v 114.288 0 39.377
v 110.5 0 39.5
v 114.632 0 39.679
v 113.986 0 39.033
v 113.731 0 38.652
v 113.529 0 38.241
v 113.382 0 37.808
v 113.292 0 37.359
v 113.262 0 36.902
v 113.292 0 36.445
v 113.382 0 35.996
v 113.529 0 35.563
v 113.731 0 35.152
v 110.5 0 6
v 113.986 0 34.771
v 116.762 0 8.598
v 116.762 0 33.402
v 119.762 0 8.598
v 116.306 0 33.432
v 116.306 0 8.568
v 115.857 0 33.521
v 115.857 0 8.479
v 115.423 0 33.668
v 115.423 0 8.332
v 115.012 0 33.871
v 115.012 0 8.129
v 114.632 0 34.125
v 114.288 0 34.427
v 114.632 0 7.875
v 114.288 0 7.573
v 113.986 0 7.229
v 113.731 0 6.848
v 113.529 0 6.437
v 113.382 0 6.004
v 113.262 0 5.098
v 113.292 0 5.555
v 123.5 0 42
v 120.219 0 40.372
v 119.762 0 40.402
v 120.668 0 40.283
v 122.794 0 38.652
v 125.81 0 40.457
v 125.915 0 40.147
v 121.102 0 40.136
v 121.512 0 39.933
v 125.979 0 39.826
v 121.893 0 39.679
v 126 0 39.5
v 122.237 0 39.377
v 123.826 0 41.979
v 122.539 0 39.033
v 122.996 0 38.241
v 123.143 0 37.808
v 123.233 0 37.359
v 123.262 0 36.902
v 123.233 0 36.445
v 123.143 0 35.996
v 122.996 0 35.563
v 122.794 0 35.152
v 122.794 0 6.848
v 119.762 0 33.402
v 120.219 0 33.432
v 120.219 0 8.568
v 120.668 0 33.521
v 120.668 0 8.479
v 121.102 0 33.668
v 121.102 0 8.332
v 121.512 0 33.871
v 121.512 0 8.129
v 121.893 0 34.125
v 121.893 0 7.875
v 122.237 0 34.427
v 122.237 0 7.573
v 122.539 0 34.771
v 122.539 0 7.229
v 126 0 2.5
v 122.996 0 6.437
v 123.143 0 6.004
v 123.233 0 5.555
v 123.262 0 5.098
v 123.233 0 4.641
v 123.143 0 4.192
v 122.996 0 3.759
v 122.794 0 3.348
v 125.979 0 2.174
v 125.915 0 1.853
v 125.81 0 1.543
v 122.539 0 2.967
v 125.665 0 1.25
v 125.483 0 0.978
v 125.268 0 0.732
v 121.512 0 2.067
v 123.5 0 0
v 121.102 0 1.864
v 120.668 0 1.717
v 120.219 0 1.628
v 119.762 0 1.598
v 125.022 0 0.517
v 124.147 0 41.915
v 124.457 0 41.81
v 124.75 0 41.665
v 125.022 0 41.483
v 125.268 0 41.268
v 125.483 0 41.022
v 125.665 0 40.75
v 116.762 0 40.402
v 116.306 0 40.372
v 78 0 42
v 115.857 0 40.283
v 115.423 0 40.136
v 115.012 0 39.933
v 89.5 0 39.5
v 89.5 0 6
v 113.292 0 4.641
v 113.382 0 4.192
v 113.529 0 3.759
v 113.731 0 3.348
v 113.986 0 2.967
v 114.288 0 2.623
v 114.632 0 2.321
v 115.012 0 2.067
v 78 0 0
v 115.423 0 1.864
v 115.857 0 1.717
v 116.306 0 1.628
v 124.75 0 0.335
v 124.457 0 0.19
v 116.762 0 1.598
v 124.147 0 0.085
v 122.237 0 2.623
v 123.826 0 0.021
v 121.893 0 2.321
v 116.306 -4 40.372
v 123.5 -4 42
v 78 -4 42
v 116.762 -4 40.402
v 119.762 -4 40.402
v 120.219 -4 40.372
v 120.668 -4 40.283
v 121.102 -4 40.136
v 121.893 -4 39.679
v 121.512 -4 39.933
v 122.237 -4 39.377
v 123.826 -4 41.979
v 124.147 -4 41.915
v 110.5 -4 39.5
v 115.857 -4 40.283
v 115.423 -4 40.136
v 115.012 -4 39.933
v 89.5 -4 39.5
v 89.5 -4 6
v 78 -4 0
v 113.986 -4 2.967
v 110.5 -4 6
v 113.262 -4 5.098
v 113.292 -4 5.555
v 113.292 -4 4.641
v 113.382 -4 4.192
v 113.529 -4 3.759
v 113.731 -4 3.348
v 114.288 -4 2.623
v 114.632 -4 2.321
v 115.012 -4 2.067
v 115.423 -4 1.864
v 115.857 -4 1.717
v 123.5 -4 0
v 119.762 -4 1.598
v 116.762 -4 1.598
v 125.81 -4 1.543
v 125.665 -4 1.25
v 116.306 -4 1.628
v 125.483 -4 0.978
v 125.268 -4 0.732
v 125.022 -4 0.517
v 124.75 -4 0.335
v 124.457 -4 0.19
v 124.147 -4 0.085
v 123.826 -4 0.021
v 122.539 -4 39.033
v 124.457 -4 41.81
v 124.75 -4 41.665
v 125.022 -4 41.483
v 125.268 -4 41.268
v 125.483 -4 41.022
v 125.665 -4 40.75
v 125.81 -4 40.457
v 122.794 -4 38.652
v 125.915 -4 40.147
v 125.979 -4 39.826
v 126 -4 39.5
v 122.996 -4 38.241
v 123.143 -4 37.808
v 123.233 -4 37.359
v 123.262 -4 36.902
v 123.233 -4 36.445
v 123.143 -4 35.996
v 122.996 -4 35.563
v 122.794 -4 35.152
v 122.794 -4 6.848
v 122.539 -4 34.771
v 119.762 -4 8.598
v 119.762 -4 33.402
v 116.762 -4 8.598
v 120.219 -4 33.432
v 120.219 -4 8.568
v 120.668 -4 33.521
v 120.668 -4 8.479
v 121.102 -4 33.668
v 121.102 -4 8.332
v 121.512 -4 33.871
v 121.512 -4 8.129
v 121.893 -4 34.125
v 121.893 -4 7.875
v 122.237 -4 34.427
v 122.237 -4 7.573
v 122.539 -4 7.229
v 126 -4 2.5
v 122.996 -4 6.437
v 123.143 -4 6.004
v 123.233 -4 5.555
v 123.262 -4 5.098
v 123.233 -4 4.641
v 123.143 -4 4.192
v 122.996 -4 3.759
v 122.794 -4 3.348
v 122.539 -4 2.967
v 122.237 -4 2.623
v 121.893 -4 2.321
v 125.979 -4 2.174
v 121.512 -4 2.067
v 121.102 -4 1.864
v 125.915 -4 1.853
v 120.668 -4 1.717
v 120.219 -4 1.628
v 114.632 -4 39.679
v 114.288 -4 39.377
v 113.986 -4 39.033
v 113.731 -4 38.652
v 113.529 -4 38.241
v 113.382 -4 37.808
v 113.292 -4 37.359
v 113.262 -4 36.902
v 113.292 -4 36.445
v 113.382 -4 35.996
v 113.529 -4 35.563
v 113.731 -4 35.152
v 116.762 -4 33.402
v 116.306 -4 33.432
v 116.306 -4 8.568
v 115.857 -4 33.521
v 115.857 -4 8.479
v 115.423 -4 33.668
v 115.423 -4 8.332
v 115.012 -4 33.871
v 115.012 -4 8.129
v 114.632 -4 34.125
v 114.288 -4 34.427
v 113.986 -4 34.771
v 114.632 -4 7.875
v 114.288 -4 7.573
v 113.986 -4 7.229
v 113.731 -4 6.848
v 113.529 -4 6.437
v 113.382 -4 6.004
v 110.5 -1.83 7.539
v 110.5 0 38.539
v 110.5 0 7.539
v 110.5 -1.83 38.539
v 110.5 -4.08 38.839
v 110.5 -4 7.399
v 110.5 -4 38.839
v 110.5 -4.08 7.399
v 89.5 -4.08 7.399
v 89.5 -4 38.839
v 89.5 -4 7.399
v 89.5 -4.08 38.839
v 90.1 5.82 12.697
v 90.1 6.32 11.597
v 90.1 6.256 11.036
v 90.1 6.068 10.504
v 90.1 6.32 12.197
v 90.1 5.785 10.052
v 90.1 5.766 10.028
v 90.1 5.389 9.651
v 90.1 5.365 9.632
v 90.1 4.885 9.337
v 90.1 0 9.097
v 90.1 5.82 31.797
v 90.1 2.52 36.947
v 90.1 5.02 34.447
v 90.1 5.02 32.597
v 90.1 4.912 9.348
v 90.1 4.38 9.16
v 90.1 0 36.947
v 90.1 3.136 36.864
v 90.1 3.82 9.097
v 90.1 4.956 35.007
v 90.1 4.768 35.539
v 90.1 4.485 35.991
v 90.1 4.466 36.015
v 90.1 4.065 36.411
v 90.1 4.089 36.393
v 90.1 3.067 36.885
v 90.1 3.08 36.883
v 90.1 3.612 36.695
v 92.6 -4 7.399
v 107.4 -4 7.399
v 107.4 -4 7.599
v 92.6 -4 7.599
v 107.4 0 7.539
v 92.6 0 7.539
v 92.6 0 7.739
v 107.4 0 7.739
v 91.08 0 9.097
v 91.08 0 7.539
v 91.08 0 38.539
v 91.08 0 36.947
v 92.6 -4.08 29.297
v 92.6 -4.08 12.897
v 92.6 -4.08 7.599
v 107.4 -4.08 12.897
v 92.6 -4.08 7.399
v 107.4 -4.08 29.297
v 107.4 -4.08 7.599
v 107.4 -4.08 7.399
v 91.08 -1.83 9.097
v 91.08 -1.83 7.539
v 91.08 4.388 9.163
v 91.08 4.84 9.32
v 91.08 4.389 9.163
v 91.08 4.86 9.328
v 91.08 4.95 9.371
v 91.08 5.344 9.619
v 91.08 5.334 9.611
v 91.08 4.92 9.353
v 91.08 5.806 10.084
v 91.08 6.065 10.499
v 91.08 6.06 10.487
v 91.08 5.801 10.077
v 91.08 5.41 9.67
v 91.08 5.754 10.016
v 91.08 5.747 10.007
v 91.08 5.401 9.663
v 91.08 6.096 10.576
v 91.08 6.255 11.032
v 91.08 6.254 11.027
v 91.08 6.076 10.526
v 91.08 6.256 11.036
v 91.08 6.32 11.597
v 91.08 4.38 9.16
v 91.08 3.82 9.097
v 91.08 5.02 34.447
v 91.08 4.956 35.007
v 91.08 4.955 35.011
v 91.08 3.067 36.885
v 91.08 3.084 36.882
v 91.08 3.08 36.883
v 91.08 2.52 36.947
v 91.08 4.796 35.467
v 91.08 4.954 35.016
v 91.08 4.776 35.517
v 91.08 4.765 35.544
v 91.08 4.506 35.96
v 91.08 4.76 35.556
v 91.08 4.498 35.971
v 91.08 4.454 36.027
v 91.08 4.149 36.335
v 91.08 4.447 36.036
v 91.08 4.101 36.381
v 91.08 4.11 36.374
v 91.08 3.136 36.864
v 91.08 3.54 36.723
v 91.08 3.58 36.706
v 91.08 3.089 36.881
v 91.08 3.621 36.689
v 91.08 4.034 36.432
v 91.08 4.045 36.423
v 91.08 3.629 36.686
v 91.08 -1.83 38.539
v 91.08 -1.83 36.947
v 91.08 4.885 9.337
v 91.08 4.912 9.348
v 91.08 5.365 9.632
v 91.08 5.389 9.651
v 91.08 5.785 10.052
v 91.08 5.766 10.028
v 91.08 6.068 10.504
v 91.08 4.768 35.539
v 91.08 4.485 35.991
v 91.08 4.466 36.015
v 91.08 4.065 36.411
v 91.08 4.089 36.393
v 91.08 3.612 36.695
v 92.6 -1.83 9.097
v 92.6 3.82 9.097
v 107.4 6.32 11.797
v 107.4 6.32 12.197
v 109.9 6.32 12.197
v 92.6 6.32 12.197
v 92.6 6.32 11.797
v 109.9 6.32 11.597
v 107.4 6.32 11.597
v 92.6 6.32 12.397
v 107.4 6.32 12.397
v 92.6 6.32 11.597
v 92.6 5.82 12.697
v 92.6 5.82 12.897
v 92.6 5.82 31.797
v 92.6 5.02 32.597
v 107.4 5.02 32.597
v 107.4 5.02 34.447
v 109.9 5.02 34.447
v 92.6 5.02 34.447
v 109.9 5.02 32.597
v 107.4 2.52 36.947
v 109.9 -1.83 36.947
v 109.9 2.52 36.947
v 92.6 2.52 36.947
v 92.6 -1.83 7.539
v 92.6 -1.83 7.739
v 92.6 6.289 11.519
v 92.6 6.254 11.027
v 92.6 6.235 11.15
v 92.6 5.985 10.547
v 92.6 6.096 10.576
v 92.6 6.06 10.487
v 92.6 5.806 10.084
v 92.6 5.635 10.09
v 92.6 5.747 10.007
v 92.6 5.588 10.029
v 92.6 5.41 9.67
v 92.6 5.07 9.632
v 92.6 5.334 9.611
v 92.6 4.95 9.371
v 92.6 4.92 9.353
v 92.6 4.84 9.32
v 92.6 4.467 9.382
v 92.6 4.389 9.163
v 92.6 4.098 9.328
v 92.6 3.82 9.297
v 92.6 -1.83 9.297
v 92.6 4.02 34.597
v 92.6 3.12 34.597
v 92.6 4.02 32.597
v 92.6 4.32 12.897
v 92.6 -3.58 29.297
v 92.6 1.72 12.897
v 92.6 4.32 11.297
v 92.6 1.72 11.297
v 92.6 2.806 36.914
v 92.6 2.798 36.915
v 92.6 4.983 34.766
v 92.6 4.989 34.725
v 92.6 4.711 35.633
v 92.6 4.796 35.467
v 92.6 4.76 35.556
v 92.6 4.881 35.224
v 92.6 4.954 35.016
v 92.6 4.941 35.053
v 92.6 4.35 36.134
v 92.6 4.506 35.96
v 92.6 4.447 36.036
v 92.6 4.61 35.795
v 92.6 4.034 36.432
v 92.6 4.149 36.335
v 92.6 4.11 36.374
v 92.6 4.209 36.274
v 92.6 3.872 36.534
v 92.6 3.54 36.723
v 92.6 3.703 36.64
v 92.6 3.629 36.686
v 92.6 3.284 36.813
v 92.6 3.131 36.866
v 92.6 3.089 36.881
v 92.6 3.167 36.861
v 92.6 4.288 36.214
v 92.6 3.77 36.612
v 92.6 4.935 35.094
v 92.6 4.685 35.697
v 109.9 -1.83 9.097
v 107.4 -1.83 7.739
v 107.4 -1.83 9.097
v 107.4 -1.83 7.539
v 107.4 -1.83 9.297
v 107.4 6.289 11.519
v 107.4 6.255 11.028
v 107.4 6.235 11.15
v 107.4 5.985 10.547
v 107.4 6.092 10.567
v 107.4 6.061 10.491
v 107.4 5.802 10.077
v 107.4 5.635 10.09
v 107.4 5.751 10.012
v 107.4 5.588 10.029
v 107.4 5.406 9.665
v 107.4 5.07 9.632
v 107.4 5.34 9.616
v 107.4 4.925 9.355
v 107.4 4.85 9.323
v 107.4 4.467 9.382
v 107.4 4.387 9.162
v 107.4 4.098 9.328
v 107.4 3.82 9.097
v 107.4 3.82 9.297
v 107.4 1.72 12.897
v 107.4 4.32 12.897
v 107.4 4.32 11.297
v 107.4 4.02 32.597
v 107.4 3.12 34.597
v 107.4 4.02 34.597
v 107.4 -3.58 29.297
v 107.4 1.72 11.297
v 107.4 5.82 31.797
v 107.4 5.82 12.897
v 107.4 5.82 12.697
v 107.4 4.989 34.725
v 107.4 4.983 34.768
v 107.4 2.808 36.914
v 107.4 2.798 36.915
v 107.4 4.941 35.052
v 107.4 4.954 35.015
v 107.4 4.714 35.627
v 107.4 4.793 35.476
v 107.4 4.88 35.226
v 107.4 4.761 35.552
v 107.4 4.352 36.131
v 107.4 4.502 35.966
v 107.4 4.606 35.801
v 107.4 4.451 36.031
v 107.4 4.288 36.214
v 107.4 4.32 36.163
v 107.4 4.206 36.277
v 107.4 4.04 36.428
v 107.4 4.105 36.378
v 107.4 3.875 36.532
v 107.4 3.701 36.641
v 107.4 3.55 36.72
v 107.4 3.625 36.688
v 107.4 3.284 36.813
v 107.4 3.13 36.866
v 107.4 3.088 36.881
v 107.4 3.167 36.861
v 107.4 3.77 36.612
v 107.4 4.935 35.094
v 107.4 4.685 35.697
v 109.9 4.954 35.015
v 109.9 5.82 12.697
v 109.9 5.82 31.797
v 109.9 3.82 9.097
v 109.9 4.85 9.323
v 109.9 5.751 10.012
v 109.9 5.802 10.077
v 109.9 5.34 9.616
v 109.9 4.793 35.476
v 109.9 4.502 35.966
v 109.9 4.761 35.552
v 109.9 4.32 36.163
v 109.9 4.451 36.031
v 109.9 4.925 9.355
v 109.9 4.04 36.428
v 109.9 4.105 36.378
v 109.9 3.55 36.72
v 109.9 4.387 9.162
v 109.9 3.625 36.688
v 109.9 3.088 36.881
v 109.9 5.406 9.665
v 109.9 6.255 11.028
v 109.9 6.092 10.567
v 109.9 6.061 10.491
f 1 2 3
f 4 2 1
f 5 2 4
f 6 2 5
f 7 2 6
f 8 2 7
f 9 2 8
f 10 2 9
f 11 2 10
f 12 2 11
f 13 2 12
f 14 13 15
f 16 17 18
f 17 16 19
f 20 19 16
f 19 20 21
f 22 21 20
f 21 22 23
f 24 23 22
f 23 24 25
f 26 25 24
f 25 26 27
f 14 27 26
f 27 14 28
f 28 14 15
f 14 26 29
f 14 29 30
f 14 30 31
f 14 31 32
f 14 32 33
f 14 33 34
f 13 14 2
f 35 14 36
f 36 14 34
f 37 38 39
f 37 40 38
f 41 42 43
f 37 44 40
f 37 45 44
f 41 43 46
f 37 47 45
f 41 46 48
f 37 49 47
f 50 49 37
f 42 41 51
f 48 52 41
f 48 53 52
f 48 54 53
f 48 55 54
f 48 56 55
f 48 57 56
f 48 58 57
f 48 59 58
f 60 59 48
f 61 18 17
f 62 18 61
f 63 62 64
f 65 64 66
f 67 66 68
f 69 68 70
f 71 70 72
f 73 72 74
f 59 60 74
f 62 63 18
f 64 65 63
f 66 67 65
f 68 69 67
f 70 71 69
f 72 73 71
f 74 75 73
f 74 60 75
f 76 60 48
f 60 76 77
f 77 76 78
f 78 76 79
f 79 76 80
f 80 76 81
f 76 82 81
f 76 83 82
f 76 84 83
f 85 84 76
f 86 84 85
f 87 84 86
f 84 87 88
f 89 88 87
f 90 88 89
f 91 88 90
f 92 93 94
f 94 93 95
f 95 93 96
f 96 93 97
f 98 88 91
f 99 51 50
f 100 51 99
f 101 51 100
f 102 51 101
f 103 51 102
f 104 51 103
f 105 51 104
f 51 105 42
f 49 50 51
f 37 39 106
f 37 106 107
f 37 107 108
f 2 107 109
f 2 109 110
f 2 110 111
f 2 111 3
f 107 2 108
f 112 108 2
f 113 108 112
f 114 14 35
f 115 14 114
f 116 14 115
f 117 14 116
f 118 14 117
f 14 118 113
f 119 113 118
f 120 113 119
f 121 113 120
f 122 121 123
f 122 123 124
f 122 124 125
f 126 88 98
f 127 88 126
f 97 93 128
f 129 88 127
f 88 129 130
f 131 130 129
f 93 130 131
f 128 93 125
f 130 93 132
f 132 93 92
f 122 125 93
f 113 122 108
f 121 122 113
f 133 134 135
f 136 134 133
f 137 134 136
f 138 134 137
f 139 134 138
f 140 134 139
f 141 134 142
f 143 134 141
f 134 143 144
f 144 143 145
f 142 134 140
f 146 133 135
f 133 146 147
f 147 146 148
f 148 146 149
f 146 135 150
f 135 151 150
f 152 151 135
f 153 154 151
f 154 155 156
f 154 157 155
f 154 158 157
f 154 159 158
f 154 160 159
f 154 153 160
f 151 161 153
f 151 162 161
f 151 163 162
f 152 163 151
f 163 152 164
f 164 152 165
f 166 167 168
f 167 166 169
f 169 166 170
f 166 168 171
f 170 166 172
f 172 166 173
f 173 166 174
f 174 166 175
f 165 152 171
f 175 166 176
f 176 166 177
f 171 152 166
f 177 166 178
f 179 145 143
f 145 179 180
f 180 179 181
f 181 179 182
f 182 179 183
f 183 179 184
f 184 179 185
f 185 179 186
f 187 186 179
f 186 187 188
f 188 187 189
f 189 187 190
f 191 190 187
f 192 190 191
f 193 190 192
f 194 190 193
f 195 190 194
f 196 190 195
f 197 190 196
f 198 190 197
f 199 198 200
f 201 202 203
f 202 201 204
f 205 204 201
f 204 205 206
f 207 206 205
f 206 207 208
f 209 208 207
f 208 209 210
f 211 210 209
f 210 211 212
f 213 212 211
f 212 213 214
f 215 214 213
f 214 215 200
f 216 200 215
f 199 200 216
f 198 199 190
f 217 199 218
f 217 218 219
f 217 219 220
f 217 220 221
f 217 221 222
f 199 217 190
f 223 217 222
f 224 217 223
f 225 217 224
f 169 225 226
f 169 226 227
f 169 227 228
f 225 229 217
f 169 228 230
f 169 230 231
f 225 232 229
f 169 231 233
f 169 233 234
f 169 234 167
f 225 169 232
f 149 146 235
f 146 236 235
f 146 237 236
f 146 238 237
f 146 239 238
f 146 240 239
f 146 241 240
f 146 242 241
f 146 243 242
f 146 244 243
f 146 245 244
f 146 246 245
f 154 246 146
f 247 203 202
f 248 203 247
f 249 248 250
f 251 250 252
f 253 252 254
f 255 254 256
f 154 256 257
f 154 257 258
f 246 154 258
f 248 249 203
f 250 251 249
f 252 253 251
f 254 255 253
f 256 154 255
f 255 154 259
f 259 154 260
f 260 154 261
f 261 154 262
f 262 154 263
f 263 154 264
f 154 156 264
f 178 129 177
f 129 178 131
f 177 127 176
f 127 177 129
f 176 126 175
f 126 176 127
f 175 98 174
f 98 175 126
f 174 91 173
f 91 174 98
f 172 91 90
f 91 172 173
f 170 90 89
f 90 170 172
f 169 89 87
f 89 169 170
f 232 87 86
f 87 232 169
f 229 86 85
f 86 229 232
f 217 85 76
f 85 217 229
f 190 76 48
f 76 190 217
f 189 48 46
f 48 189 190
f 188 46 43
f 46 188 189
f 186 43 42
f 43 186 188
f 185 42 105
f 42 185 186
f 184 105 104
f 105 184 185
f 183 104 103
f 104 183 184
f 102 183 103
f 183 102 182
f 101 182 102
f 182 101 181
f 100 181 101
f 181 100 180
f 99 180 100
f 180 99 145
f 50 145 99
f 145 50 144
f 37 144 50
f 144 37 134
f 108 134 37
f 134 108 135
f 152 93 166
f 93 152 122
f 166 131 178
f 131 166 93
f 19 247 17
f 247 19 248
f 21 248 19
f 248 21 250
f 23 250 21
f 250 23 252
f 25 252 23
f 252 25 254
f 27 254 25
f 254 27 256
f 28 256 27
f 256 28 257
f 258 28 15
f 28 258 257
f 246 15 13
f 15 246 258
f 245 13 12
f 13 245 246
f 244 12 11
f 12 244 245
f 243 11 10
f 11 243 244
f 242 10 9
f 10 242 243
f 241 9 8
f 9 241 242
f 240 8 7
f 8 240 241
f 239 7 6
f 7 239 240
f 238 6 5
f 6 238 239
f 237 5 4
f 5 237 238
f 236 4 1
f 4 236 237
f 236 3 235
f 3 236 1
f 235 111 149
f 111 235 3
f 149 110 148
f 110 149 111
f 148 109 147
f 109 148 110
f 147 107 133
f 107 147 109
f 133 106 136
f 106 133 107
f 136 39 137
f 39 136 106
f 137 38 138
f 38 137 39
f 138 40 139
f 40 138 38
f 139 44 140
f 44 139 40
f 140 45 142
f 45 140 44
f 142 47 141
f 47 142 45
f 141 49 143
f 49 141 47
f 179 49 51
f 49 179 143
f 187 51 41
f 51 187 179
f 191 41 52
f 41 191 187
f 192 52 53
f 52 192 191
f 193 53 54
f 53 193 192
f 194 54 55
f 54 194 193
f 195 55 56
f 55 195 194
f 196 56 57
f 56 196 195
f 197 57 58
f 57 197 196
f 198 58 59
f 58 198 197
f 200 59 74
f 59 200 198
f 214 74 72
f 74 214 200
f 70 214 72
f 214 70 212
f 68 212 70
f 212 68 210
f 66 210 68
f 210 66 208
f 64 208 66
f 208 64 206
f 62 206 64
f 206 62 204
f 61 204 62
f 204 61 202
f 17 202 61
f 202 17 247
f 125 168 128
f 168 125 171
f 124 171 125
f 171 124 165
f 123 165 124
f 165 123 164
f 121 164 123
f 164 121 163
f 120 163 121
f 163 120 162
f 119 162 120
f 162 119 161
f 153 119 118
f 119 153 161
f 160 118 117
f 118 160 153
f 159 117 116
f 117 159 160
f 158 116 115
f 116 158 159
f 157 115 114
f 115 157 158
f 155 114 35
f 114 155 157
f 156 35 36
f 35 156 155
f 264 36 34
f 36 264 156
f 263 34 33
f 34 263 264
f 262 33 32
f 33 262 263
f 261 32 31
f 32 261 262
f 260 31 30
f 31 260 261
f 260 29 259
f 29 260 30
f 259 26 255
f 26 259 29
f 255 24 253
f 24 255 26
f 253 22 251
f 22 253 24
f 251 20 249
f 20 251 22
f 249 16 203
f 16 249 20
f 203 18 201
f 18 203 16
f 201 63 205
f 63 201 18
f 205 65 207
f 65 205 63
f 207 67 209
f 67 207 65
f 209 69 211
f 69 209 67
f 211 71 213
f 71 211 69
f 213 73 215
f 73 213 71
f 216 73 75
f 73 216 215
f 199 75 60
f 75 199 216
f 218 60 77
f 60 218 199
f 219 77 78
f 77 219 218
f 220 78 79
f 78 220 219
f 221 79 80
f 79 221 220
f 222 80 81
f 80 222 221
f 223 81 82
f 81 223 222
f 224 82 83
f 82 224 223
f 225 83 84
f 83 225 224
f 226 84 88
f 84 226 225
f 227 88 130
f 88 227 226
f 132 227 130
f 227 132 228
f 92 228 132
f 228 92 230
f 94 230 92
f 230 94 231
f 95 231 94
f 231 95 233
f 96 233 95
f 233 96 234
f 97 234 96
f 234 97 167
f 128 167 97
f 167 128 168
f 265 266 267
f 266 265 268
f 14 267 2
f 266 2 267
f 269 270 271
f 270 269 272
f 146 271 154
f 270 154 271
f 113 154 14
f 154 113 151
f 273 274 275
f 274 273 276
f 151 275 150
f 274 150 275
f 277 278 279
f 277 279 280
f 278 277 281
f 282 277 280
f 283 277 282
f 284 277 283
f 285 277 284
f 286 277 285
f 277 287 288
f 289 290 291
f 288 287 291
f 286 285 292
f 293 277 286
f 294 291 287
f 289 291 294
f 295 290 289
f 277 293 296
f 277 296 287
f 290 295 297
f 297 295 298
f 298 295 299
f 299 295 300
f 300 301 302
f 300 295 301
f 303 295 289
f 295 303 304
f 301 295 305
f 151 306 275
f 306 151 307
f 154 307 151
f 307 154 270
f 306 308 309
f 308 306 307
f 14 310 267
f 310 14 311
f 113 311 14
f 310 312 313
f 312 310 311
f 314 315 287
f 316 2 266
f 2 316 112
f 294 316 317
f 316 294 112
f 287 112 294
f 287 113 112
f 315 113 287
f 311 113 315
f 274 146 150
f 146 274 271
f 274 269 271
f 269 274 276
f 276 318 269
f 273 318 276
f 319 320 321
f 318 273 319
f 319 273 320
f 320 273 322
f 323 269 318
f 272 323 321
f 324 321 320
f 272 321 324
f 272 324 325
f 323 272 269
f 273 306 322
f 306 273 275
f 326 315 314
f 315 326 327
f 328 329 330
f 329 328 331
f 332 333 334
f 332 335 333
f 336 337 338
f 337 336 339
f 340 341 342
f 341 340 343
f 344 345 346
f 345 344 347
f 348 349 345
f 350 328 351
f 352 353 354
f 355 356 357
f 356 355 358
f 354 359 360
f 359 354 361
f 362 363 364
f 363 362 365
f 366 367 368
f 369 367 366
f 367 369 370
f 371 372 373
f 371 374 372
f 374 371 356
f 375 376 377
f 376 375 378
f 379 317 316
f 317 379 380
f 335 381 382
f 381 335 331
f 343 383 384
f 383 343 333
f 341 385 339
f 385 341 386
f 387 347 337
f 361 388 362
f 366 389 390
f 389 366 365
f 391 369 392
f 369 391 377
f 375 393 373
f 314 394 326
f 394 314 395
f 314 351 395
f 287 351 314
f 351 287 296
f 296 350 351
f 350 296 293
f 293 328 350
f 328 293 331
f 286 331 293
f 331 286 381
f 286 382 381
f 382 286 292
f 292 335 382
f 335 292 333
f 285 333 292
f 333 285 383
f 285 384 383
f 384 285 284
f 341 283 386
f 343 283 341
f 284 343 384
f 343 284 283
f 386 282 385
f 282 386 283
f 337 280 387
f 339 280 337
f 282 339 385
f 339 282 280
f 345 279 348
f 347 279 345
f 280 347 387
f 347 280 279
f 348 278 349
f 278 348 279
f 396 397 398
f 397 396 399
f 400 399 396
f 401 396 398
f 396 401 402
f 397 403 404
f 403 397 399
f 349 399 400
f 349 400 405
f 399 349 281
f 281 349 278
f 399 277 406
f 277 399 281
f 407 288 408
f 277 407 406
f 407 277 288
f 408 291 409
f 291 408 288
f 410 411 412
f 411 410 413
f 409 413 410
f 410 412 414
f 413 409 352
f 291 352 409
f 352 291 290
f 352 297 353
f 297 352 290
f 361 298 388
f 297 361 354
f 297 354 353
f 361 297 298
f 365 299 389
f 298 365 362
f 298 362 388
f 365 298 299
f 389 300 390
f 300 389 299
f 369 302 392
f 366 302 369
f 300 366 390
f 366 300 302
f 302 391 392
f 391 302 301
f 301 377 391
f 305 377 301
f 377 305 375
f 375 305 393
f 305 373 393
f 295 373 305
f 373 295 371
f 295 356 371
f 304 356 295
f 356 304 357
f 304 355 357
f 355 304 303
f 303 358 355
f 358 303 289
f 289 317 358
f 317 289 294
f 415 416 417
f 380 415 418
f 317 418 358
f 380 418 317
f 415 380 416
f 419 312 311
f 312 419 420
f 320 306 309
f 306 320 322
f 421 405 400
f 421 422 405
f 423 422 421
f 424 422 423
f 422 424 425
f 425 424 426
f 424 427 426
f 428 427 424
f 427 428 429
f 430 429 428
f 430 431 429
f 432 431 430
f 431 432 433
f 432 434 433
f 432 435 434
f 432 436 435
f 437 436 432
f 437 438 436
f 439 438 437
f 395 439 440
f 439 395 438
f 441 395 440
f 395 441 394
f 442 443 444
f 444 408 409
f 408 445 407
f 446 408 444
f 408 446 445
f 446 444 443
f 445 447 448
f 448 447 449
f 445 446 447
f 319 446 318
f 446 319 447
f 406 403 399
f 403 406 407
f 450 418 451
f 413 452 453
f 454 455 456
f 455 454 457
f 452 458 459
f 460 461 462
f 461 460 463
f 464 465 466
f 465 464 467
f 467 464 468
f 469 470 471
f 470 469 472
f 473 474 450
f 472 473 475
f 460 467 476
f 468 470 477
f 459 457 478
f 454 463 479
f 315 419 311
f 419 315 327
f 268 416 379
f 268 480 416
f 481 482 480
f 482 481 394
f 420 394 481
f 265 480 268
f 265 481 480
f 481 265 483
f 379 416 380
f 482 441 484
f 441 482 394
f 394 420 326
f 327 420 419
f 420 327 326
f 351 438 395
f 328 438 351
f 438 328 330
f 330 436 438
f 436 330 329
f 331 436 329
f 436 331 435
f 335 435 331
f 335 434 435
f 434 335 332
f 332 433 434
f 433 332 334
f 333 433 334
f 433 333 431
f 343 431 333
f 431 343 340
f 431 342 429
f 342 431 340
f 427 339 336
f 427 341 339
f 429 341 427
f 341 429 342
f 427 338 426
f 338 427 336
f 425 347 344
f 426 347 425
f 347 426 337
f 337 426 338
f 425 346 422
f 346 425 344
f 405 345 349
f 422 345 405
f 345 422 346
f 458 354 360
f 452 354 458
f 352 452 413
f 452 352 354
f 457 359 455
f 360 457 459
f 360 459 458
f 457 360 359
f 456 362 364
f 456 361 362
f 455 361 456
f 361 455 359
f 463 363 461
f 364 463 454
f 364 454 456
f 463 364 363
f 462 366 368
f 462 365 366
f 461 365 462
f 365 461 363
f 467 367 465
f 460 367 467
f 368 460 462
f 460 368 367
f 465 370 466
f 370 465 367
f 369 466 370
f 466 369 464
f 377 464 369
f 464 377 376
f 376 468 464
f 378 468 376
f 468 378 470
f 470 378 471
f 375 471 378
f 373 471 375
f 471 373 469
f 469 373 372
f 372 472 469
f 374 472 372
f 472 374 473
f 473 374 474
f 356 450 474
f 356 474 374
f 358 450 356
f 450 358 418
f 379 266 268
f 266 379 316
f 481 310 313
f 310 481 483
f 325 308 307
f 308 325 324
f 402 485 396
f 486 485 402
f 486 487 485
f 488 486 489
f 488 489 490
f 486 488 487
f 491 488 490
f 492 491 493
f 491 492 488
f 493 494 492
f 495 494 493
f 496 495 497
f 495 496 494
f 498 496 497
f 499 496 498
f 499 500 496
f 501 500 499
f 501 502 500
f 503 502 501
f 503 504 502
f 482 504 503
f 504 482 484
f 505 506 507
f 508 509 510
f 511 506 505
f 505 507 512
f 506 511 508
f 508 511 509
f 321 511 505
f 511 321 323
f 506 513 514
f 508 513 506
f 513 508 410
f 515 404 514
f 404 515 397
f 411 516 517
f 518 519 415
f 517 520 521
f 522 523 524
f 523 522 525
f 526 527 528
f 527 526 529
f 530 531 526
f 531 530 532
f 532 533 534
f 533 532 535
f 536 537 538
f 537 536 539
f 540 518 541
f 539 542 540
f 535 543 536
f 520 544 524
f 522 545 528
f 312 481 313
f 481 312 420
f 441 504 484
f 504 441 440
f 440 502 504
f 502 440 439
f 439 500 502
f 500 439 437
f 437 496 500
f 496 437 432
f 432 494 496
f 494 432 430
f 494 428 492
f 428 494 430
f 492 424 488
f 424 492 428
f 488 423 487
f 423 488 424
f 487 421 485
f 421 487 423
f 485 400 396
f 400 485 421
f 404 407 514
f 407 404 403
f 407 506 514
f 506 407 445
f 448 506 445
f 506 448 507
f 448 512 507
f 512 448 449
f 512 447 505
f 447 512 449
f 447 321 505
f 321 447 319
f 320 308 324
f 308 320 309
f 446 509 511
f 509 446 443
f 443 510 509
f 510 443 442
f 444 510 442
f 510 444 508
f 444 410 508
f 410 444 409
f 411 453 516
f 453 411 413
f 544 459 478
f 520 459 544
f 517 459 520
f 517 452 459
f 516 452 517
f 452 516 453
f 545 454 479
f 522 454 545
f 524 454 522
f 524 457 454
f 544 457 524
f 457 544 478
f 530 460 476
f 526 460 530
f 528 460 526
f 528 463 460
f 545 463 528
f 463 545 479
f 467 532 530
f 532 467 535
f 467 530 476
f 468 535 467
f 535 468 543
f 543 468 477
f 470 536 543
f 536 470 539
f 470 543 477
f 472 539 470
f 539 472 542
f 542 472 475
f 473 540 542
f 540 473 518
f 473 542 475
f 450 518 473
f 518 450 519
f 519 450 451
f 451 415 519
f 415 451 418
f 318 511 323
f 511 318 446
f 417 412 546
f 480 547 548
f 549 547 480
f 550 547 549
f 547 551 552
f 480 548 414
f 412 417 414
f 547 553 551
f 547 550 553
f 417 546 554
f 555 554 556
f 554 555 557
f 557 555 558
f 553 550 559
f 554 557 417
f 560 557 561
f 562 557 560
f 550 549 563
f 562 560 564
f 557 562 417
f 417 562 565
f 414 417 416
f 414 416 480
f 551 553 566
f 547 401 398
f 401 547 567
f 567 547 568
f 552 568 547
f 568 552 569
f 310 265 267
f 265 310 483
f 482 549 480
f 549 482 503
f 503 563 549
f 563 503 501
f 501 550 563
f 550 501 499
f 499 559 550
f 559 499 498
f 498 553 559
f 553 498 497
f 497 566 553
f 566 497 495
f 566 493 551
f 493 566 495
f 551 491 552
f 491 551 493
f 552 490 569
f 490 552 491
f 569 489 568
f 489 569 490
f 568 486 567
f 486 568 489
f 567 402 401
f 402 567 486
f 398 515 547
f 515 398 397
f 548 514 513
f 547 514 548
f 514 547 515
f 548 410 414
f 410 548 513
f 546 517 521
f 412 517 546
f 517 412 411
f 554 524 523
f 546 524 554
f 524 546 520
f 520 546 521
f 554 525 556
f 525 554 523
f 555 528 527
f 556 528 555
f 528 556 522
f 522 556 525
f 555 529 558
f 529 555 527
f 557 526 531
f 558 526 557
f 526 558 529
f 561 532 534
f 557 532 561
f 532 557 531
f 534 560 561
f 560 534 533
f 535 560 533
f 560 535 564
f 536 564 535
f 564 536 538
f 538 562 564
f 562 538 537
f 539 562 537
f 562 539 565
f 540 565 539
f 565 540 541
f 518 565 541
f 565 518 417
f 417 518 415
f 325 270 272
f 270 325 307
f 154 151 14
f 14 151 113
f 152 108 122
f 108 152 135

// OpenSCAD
// Lab Rax generic equipment tray + faceplate (wizard template).
// Faceplate derived from the Pi4 baseline; rack holes follow the four-corner layout of the user-supplied
// 1U blank plate (faceplate_mounting.json): EVERY rack unit gets 4 holes, never a single centre pair.
// The wizard appends override assignments at the end of this file.
// PROPOSED, UNVALIDATED: printed fit, strength and rack clearance are UNKNOWN.
$fn=48;
part="assembly";            // assembly, faceplate, tray, combined, rear_bracket
// Device envelope (mm). Origin of hole coordinates = device front-left corner, seen from above.
dev_w=85; dev_d=56; dev_h=20;
holes=[];                   // [[x,y],...] mounting hole centres
hole_d=2.7;                 // device mounting hole diameter
device_mount="inserts";     // inserts, pegs, clips, straps
standoff=6;                 // device lift above tray floor
insert_pilot=3.2;           // pilot for heat-set insert (inserts mode)
board_t=1.6;                // board/flange thickness (pegs, clips)
joint="screw";              // screw, single ("snap" retired 2026-10-19: too brittle; kept as history)
u=1;                        // faceplate height in rack units
keystones=[];               // [x,...] keystone centres on faceplate (X=0 centre)
// Keystone v2 (2026-10-19, now the fallback; see ks_style): re-modelled from measurements of Brian's reference keystone frame
// (14.5 x 16 opening was too narrow when printed). Opening 14.8 x 16.6 through the plate, plus a rear collar
// 19.8 x 27.85 reaching 9.2 mm behind the front face (bottom lip to 10.4) that carries the latch ramp and catches.
ks_w=14.8; ks_h=16.6;       // front opening
ks_ow=19.8; ks_ob=11.9; ks_ot=15.95; ks_od=9.2; ks_lip=10.4;  // collar width, below/above opening centre, depth
ports=[];                   // [[x,z,w,h,r],...] faceplate cut-outs, z from plate bottom, r=corner radius
front_gap=12;               // device front to faceplate rear face
margin=8;                   // tray border around device
rear_support=false;         // heavy/deep equipment: tray runs to the rear posts and screws to a rear bracket
coupon=[];                  // test coupon: [x0,x1,ymax] keeps only that slice of the part

// 4 mm plate (owner default 2026-10-18). Corner radius is limited by the four-corner holes:
// the reference holes sit 1.6 mm from the top/bottom edge, so larger corners would cut into them.
plate_w=252; plate_t=4; plate_r=2.5; plate_h=u*44.45-2.45;
hole_x=118.2625; hole_dz=15.902;   // each U: holes at its centre ±hole_dz (5.098 / 36.902 on a 1U plate)
rack_depth=240;             // Lab Rax frame depth (front of front posts to back of rear posts)
nudge=0;                    // render-repair only: tiny size offset applied when OpenSCAD 2021 emits a sliver
tray_t=3; tray_z=7;
tray_w=dev_w+2*margin; tray_d=rear_support?rack_depth:dev_d+front_gap+margin;
tray_x=-tray_w/2; tray_y=0;
dev_x=-dev_w/2; dev_y=front_gap; floor_top=tray_z+tray_t;
jx=min(40,tray_w/2-12); joint_x=[-jx,jx];
tongue_w=12; tongue_depth=7; tongue_h=3; tongue_z=tray_z+3.5;
slot_clear=0.3; boss_d=9; m3_clear=3.4; joint_pilot=4.0;  // 4.0 = the printed, well-fitting Pi4 trial

module capsule2d(len=10,diam=7){hull(){translate([-(len-diam)/2,0])circle(d=diam);translate([(len-diam)/2,0])circle(d=diam);}}
module rrect(w,h,r){rr=min(r,w/2-0.01,h/2-0.01);if(rr<=0)square([w,h],center=true);else offset(r=rr)square([w-2*rr,h-2*rr],center=true);}
// Mirror front-of-tray features to the rear (about the rack's mid-depth).
module to_rear(){translate([0,rack_depth/2,0])mirror([0,1,0])translate([0,-rack_depth/2,0])children();}

// Faceplate outline seen from the front: 2D X = rack X, 2D Y = height Z.
// rear=true cuts the larger keystone pocket; plain=true leaves out keystones/ports (rear bracket).
module plate2d(rear=false,plain=false){
 difference(){
  hull()for(sx=[-1,1],sz=[-1,1])translate([sx*(plate_w/2-plate_r),plate_h/2+sz*(plate_h/2-plate_r)])circle(r=plate_r+nudge);
  for(i=[0:u-1],dz=[-hole_dz,hole_dz],x=[-hole_x,hole_x])translate([x,i*44.45+21+dz])capsule2d();
  if(!plain){
   for(p=ports)translate([p[0],p[1]])rrect(p[2],p[3],p[4]);
  }
 }
}
// Plate between y=y0 (front) and y0+t, built from the 2D outline (cleaner meshes than 3D cuts in OpenSCAD 2021).
module plate_layer(y0,t,rear=false,plain=false){translate([0,y0+t,0])rotate([90,0,0])linear_extrude(height=t)plate2d(rear,plain);}

module plate_joint_add(){
 if(joint=="screw"){
  for(x=joint_x)translate([x-tongue_w/2,0,tongue_z])cube([tongue_w,tongue_depth,tongue_h]);
  for(x=joint_x)translate([x,0,tray_z+14])rotate([-90,0,0])cylinder(d=boss_d,h=8);
 }
 if(joint=="snap") for(x=joint_x){
  // Cantilever arm under the tray floor; barb snaps up into a floor window.
  translate([x-4,0,tray_z-2])cube([8,16,2]);
  // Barb v2: square catch face toward the plate, ramp falling toward the rear so the tray, slid in
  // from the rear, cams the arm down until its window drops over the barb.
  translate([x-4,12,tray_z])hull(){cube([8,0.6,1.2]);cube([8,2.4,0.01]);}
 }
}
// Keystone collar behind the plate, and the jack-shaped cut through plate + collar.
// Profile in (d = depth behind front face, z from opening centre); X width is ks_w throughout.
module ks_collar(){for(x=keystones)translate([x-ks_ow/2,-plate_t,plate_h/2]){
 translate([0,0,-ks_ob])cube([ks_ow,ks_od,ks_ob+ks_ot]);
 translate([0,0,-ks_ob])cube([ks_ow,ks_lip,ks_ob-ks_h/2]);
}}
module ks_cut(){for(x=keystones)translate([x-ks_w/2,-plate_t,plate_h/2])rotate([90,0,90])linear_extrude(height=ks_w)
 polygon([[-1,-ks_h/2],[5.8,-ks_h/2],[5.8,-9.9],[9.2,-9.9],[9.2,-ks_h/2],[11,-ks_h/2],[11,11.6],[8.2,11.6],
          [8.2,ks_ot+1],[7.2,ks_ot+1],[7.2,13.6],[0.6,ks_h/2],[-1,ks_h/2]]);}
// Golden keystone (Brian, 2026-10-19): exact cross-sections of the keystone on Brian's SG108 faceplate, which fits
// perfectly in practice. Source: "10 inch shelf TP-Link SG108 Plus Keystone" by Goul (MakerWorld remix, BY-NC-SA),
// local/personal use only, never redistributed. Each band: [X from opening centre, width, polygons in source (Y, Z)]
// with source Y running down the plate (opening centre Y=25.09) and Z = depth (keystone face 0, plate back 4.08).
// The block replaces the plate within 21 x 33.5 mm around each keystone; front face sits 0.08 proud like the source.
ks_style="golden";          // golden (SG108 copy) or v2 (own measured rebuild, kept as fallback)
// Brian, 2026-10-19: the golden v3 print fit left/right well but had ~0.4 mm play up/down. ks_tight moves the
// bottom (hook-side) edge of the opening, its hook groove and lip up by this much; the latch side is unchanged.
ks_tight=0.4;
KS_GOLD=[
  [-10.50,0.60,[[[45.500,4.080],[45.500,0.080],[38.691,0.080],[38.691,0.000],[7.251,0.000],[7.251,0.080],[1.000,0.080],[1.000,4.080],[1.071,4.080]]]],
  [-9.90,0.98,[[[9.143,4.080],[9.143,6.600],[9.205,7.147],[9.207,7.160],[9.226,7.216],[9.395,7.692],[9.679,8.145],[9.697,8.169],[10.075,8.546],[10.099,8.565],[10.551,8.848],[11.083,9.036],[11.643,9.100],[13.493,9.100],[14.293,9.900],[33.393,9.900],[33.893,10.400],[34.493,10.400],[35.054,10.336],[35.586,10.148],[36.038,9.865],[36.062,9.846],[36.439,9.469],[36.458,9.445],[36.742,8.992],[36.753,8.965],[36.930,8.460],[36.993,7.900],[36.993,4.080],[45.500,4.080],[45.500,0.080],[38.691,0.080],[38.691,0.000],[7.251,0.000],[7.251,0.080],[1.000,0.080],[1.000,4.080],[1.014,4.080]]]],
  [-8.92,1.52,[[[7.551,4.080],[7.551,2.250],[9.143,2.250],[9.143,6.600],[9.209,7.169],[9.367,7.620],[9.404,7.709],[9.658,8.114],[9.716,8.190],[9.755,8.229],[10.054,8.527],[10.130,8.586],[10.534,8.840],[10.623,8.876],[11.074,9.034],[11.643,9.100],[13.493,9.100],[14.293,9.900],[33.393,9.900],[33.893,10.400],[34.493,10.400],[35.063,10.334],[35.514,10.176],[35.603,10.140],[36.006,9.886],[36.083,9.827],[36.420,9.490],[36.479,9.414],[36.719,9.030],[36.737,9.000],[36.770,8.920],[36.927,8.469],[36.993,7.900],[36.993,2.250],[38.551,2.250],[38.551,4.080],[45.500,4.080],[45.500,0.080],[38.691,0.080],[38.691,0.000],[7.251,0.000],[7.251,0.080],[1.000,0.080],[1.000,4.080],[1.044,4.080]]]],
  [-7.40,14.80,[[[7.551,4.080],[7.551,2.250],[9.143,2.250],[9.143,6.600],[9.175,6.878],[9.229,7.247],[9.478,7.850],[9.876,8.368],[10.393,8.765],[10.996,9.015],[11.365,9.069],[11.643,9.100],[13.493,9.100],[13.493,8.100],[11.493,8.100],[11.493,7.200],[16.793,0.500],[16.793,0.000],[7.251,0.000],[7.251,0.080],[1.000,0.080],[1.000,4.080],[1.025,4.080]],[[45.500,4.080],[45.500,0.080],[38.691,0.080],[38.691,0.000],[33.393,0.000],[33.393,5.800],[34.993,5.800],[34.993,8.400],[33.393,8.400],[33.393,9.900],[33.893,10.400],[34.493,10.400],[34.771,10.369],[35.140,10.315],[35.743,10.065],[36.200,9.715],[36.261,9.668],[36.658,9.150],[36.908,8.547],[36.962,8.178],[36.993,7.900],[36.993,2.250],[38.551,2.250],[38.551,4.080],[42.555,4.080]]]],
  [7.40,2.50,[[[45.500,4.080],[45.500,0.080],[38.691,0.080],[38.691,0.000],[7.251,0.000],[7.251,0.080],[1.000,0.080],[1.000,4.080],[7.551,4.080],[7.551,2.250],[9.143,2.250],[9.143,6.600],[9.209,7.168],[9.370,7.630],[9.402,7.705],[9.662,8.120],[9.712,8.185],[9.927,8.400],[10.059,8.531],[10.124,8.582],[10.538,8.841],[10.614,8.873],[11.075,9.034],[11.643,9.100],[13.493,9.100],[14.293,9.900],[33.393,9.900],[33.893,10.400],[34.493,10.400],[35.062,10.335],[35.523,10.172],[35.599,10.141],[36.013,9.882],[36.078,9.831],[36.425,9.486],[36.474,9.420],[36.735,9.005],[36.767,8.930],[36.928,8.467],[36.993,7.900],[36.993,2.250],[38.551,2.250],[38.551,4.080],[42.599,4.080]]]],
  [9.90,0.60,[[[45.500,4.080],[45.500,0.080],[38.691,0.080],[38.691,0.000],[7.251,0.000],[7.251,0.080],[1.000,0.080],[1.000,4.080],[7.551,4.080],[7.551,2.250],[38.551,2.250],[38.551,4.080],[42.635,4.080]]]]
];
module ks_golden(){for(x=keystones)translate([x,0,plate_h/2])multmatrix([[1,0,0,0],[0,0,1,-4.08],[0,-1,0,25.09],[0,0,0,1]])
 intersection(){
  union()for(b=KS_GOLD)translate([b[0],0,0])rotate([90,0,90])linear_extrude(height=b[1])for(pg=b[2])
   translate([b[1]>10&&min([for(q=pg)q[0]])>30?-ks_tight:0,0])polygon(pg);  // opening band, hook side
  translate([-10.5,25.09-18.5,-0.01])cube([21,33.5,10.42]);
 }}
module ks_box_cut(){for(x=keystones)translate([x-10.5,-plate_t-0.01,plate_h/2-15])cube([21,plate_t+0.02,33.5]);}
module plate_joint_cut(){if(joint=="screw")for(x=joint_x)translate([x,-0.1,tray_z+14])rotate([-90,0,0])cylinder(d=joint_pilot,h=8.2);}

module faceplate(){
 union(){
  difference(){
   union(){
    plate_layer(-plate_t,plate_t);
    if(ks_style=="v2")ks_collar();
    plate_joint_add();
   }
   plate_joint_cut();
   if(ks_style=="v2")ks_cut(); else ks_box_cut();
  }
  if(ks_style!="v2")ks_golden();
 }
}
// Plain plate on the rear posts (mirror of the faceplate, no openings) that the tray's rear end screws/snaps to.
module rear_bracket(){to_rear()difference(){union(){plate_layer(-plate_t,plate_t,false,true);plate_joint_add();}plate_joint_cut();}}

module device_features_add(){
 if(device_mount=="inserts")for(h=holes)translate([dev_x+h[0],dev_y+h[1],floor_top])cylinder(d=max(insert_pilot+3.5,7),h=standoff);
 if(device_mount=="pegs")for(h=holes)translate([dev_x+h[0],dev_y+h[1],floor_top]){
  cylinder(d=hole_d+3,h=standoff);
  translate([0,0,standoff])cylinder(d=hole_d-0.3,h=board_t+0.8);
  translate([0,0,standoff+board_t+0.8])cylinder(d1=hole_d-0.3,d2=hole_d-1,h=0.8);
 }
 if(device_mount=="clips"){
  // Support ledges at the four corners plus a flexing clip on each side.
  for(x=[dev_x-1,dev_x+dev_w-5],y=[dev_y-1,dev_y+dev_d-5])translate([x,y,floor_top])cube([6,6,standoff]);
  for(s=[-1,1])translate([s>0?dev_x+dev_w+0.2:dev_x-2.2,dev_y+dev_d/2-5,floor_top]){
   cube([2,10,standoff+board_t+2.5]);
   translate([s>0?-1.2:2,0,standoff+board_t+0.2])hull(){cube([1.2,10,1.6]);translate([s>0?1.2:0,0,1.6])cube([0.01,10,0.6]);}
  }
 }
}
module device_features_cut(){
 if(device_mount=="inserts")for(h=holes)translate([dev_x+h[0],dev_y+h[1],floor_top+0.01])cylinder(d=insert_pilot,h=standoff+0.1);
 if(device_mount=="straps")for(x=[dev_x-5.5,dev_x+dev_w+2.5],y=[dev_y+dev_d*0.25,dev_y+dev_d*0.75])
  translate([x,y-6,tray_z-0.1])cube([3,12,tray_t+0.2]);
}

module tray_joint_add(){
 if(joint=="screw"){
  for(x=joint_x) translate([x-9,0,tray_z+tray_t])cube([18,8,5]);
  for(x=joint_x)translate([x-7,8.3,tray_z+3])cube([14,3,19]);
  for(x=joint_x) for(side=[-1,1]) translate([x+side*6-1,0,0])
    hull(){translate([0,9,tray_z+2.7])cube([2,2,0.5]);
           translate([0,9,tray_z+8])cube([2,2,0.5]);
           translate([0,20,tray_z+2.7])cube([2,2,0.5]);}
 }
}
module tray_joint_cut(){
 if(joint=="screw"){
  for(x=joint_x)translate([x-(tongue_w+slot_clear)/2,-0.1,tongue_z-slot_clear/2])cube([tongue_w+slot_clear,tongue_depth+slot_clear,tongue_h+slot_clear]);
  for(x=joint_x)translate([x,11.4,tray_z+14])rotate([90,0,0])cylinder(d=m3_clear,h=12);
 }
 if(joint=="snap")for(x=joint_x)translate([x-4.3,11.6,tray_z-0.1])cube([8.6,3.2,tray_t+0.2]);
}

module tray(){
 difference(){
  union(){
   translate([tray_x,tray_y,tray_z])cube([tray_w,tray_d,tray_t]);
   tray_joint_add();
   if(rear_support)to_rear()tray_joint_add();
   device_features_add();
  }
  tray_joint_cut();
  if(rear_support)to_rear()tray_joint_cut();
  device_features_cut();
 }
}

module clip_coupon(){if(len(coupon)==3)intersection(){children();translate([coupon[0],-50,-50])cube([coupon[1]-coupon[0],coupon[2]+50,400]);}else children();}

clip_coupon(){
 if(part=="faceplate")faceplate();
 else if(part=="tray")tray();
 else if(part=="rear_bracket")rear_bracket();
 else if(part=="combined")union(){faceplate();translate([tray_x,-0.01,tray_z])cube([tray_w,0.02+0.01,tray_t]);tray();if(rear_support)rear_bracket();}
 else {color("steelblue")faceplate();color("silver")tray();if(rear_support)color("steelblue")rear_bracket();
  %translate([dev_x,dev_y,floor_top+(device_mount=="inserts"||device_mount=="pegs"||device_mount=="clips"?standoff:0)])cube([dev_w,dev_d,dev_h]);}
}

// ---- wizard overrides: 1_Keystone_and_corner_holes
dev_w=85.0;
dev_d=56.0;
dev_h=20.0;
hole_d=2.7;
standoff=6.0;
insert_pilot=3.2;
board_t=1.6;
u=1;
holes=[[3.5, 3.5], [61.5, 3.5], [3.5, 52.5], [61.5, 52.5]];
keystones=[100.0];
device_mount="inserts";
joint="screw";
rear_support=false;
coupon=[78.0, 127.0, 11.0];
ports=[];
ks_tight=0.2;  // v5 coupon only: v4 (0.4) latch tab did not seat flush
